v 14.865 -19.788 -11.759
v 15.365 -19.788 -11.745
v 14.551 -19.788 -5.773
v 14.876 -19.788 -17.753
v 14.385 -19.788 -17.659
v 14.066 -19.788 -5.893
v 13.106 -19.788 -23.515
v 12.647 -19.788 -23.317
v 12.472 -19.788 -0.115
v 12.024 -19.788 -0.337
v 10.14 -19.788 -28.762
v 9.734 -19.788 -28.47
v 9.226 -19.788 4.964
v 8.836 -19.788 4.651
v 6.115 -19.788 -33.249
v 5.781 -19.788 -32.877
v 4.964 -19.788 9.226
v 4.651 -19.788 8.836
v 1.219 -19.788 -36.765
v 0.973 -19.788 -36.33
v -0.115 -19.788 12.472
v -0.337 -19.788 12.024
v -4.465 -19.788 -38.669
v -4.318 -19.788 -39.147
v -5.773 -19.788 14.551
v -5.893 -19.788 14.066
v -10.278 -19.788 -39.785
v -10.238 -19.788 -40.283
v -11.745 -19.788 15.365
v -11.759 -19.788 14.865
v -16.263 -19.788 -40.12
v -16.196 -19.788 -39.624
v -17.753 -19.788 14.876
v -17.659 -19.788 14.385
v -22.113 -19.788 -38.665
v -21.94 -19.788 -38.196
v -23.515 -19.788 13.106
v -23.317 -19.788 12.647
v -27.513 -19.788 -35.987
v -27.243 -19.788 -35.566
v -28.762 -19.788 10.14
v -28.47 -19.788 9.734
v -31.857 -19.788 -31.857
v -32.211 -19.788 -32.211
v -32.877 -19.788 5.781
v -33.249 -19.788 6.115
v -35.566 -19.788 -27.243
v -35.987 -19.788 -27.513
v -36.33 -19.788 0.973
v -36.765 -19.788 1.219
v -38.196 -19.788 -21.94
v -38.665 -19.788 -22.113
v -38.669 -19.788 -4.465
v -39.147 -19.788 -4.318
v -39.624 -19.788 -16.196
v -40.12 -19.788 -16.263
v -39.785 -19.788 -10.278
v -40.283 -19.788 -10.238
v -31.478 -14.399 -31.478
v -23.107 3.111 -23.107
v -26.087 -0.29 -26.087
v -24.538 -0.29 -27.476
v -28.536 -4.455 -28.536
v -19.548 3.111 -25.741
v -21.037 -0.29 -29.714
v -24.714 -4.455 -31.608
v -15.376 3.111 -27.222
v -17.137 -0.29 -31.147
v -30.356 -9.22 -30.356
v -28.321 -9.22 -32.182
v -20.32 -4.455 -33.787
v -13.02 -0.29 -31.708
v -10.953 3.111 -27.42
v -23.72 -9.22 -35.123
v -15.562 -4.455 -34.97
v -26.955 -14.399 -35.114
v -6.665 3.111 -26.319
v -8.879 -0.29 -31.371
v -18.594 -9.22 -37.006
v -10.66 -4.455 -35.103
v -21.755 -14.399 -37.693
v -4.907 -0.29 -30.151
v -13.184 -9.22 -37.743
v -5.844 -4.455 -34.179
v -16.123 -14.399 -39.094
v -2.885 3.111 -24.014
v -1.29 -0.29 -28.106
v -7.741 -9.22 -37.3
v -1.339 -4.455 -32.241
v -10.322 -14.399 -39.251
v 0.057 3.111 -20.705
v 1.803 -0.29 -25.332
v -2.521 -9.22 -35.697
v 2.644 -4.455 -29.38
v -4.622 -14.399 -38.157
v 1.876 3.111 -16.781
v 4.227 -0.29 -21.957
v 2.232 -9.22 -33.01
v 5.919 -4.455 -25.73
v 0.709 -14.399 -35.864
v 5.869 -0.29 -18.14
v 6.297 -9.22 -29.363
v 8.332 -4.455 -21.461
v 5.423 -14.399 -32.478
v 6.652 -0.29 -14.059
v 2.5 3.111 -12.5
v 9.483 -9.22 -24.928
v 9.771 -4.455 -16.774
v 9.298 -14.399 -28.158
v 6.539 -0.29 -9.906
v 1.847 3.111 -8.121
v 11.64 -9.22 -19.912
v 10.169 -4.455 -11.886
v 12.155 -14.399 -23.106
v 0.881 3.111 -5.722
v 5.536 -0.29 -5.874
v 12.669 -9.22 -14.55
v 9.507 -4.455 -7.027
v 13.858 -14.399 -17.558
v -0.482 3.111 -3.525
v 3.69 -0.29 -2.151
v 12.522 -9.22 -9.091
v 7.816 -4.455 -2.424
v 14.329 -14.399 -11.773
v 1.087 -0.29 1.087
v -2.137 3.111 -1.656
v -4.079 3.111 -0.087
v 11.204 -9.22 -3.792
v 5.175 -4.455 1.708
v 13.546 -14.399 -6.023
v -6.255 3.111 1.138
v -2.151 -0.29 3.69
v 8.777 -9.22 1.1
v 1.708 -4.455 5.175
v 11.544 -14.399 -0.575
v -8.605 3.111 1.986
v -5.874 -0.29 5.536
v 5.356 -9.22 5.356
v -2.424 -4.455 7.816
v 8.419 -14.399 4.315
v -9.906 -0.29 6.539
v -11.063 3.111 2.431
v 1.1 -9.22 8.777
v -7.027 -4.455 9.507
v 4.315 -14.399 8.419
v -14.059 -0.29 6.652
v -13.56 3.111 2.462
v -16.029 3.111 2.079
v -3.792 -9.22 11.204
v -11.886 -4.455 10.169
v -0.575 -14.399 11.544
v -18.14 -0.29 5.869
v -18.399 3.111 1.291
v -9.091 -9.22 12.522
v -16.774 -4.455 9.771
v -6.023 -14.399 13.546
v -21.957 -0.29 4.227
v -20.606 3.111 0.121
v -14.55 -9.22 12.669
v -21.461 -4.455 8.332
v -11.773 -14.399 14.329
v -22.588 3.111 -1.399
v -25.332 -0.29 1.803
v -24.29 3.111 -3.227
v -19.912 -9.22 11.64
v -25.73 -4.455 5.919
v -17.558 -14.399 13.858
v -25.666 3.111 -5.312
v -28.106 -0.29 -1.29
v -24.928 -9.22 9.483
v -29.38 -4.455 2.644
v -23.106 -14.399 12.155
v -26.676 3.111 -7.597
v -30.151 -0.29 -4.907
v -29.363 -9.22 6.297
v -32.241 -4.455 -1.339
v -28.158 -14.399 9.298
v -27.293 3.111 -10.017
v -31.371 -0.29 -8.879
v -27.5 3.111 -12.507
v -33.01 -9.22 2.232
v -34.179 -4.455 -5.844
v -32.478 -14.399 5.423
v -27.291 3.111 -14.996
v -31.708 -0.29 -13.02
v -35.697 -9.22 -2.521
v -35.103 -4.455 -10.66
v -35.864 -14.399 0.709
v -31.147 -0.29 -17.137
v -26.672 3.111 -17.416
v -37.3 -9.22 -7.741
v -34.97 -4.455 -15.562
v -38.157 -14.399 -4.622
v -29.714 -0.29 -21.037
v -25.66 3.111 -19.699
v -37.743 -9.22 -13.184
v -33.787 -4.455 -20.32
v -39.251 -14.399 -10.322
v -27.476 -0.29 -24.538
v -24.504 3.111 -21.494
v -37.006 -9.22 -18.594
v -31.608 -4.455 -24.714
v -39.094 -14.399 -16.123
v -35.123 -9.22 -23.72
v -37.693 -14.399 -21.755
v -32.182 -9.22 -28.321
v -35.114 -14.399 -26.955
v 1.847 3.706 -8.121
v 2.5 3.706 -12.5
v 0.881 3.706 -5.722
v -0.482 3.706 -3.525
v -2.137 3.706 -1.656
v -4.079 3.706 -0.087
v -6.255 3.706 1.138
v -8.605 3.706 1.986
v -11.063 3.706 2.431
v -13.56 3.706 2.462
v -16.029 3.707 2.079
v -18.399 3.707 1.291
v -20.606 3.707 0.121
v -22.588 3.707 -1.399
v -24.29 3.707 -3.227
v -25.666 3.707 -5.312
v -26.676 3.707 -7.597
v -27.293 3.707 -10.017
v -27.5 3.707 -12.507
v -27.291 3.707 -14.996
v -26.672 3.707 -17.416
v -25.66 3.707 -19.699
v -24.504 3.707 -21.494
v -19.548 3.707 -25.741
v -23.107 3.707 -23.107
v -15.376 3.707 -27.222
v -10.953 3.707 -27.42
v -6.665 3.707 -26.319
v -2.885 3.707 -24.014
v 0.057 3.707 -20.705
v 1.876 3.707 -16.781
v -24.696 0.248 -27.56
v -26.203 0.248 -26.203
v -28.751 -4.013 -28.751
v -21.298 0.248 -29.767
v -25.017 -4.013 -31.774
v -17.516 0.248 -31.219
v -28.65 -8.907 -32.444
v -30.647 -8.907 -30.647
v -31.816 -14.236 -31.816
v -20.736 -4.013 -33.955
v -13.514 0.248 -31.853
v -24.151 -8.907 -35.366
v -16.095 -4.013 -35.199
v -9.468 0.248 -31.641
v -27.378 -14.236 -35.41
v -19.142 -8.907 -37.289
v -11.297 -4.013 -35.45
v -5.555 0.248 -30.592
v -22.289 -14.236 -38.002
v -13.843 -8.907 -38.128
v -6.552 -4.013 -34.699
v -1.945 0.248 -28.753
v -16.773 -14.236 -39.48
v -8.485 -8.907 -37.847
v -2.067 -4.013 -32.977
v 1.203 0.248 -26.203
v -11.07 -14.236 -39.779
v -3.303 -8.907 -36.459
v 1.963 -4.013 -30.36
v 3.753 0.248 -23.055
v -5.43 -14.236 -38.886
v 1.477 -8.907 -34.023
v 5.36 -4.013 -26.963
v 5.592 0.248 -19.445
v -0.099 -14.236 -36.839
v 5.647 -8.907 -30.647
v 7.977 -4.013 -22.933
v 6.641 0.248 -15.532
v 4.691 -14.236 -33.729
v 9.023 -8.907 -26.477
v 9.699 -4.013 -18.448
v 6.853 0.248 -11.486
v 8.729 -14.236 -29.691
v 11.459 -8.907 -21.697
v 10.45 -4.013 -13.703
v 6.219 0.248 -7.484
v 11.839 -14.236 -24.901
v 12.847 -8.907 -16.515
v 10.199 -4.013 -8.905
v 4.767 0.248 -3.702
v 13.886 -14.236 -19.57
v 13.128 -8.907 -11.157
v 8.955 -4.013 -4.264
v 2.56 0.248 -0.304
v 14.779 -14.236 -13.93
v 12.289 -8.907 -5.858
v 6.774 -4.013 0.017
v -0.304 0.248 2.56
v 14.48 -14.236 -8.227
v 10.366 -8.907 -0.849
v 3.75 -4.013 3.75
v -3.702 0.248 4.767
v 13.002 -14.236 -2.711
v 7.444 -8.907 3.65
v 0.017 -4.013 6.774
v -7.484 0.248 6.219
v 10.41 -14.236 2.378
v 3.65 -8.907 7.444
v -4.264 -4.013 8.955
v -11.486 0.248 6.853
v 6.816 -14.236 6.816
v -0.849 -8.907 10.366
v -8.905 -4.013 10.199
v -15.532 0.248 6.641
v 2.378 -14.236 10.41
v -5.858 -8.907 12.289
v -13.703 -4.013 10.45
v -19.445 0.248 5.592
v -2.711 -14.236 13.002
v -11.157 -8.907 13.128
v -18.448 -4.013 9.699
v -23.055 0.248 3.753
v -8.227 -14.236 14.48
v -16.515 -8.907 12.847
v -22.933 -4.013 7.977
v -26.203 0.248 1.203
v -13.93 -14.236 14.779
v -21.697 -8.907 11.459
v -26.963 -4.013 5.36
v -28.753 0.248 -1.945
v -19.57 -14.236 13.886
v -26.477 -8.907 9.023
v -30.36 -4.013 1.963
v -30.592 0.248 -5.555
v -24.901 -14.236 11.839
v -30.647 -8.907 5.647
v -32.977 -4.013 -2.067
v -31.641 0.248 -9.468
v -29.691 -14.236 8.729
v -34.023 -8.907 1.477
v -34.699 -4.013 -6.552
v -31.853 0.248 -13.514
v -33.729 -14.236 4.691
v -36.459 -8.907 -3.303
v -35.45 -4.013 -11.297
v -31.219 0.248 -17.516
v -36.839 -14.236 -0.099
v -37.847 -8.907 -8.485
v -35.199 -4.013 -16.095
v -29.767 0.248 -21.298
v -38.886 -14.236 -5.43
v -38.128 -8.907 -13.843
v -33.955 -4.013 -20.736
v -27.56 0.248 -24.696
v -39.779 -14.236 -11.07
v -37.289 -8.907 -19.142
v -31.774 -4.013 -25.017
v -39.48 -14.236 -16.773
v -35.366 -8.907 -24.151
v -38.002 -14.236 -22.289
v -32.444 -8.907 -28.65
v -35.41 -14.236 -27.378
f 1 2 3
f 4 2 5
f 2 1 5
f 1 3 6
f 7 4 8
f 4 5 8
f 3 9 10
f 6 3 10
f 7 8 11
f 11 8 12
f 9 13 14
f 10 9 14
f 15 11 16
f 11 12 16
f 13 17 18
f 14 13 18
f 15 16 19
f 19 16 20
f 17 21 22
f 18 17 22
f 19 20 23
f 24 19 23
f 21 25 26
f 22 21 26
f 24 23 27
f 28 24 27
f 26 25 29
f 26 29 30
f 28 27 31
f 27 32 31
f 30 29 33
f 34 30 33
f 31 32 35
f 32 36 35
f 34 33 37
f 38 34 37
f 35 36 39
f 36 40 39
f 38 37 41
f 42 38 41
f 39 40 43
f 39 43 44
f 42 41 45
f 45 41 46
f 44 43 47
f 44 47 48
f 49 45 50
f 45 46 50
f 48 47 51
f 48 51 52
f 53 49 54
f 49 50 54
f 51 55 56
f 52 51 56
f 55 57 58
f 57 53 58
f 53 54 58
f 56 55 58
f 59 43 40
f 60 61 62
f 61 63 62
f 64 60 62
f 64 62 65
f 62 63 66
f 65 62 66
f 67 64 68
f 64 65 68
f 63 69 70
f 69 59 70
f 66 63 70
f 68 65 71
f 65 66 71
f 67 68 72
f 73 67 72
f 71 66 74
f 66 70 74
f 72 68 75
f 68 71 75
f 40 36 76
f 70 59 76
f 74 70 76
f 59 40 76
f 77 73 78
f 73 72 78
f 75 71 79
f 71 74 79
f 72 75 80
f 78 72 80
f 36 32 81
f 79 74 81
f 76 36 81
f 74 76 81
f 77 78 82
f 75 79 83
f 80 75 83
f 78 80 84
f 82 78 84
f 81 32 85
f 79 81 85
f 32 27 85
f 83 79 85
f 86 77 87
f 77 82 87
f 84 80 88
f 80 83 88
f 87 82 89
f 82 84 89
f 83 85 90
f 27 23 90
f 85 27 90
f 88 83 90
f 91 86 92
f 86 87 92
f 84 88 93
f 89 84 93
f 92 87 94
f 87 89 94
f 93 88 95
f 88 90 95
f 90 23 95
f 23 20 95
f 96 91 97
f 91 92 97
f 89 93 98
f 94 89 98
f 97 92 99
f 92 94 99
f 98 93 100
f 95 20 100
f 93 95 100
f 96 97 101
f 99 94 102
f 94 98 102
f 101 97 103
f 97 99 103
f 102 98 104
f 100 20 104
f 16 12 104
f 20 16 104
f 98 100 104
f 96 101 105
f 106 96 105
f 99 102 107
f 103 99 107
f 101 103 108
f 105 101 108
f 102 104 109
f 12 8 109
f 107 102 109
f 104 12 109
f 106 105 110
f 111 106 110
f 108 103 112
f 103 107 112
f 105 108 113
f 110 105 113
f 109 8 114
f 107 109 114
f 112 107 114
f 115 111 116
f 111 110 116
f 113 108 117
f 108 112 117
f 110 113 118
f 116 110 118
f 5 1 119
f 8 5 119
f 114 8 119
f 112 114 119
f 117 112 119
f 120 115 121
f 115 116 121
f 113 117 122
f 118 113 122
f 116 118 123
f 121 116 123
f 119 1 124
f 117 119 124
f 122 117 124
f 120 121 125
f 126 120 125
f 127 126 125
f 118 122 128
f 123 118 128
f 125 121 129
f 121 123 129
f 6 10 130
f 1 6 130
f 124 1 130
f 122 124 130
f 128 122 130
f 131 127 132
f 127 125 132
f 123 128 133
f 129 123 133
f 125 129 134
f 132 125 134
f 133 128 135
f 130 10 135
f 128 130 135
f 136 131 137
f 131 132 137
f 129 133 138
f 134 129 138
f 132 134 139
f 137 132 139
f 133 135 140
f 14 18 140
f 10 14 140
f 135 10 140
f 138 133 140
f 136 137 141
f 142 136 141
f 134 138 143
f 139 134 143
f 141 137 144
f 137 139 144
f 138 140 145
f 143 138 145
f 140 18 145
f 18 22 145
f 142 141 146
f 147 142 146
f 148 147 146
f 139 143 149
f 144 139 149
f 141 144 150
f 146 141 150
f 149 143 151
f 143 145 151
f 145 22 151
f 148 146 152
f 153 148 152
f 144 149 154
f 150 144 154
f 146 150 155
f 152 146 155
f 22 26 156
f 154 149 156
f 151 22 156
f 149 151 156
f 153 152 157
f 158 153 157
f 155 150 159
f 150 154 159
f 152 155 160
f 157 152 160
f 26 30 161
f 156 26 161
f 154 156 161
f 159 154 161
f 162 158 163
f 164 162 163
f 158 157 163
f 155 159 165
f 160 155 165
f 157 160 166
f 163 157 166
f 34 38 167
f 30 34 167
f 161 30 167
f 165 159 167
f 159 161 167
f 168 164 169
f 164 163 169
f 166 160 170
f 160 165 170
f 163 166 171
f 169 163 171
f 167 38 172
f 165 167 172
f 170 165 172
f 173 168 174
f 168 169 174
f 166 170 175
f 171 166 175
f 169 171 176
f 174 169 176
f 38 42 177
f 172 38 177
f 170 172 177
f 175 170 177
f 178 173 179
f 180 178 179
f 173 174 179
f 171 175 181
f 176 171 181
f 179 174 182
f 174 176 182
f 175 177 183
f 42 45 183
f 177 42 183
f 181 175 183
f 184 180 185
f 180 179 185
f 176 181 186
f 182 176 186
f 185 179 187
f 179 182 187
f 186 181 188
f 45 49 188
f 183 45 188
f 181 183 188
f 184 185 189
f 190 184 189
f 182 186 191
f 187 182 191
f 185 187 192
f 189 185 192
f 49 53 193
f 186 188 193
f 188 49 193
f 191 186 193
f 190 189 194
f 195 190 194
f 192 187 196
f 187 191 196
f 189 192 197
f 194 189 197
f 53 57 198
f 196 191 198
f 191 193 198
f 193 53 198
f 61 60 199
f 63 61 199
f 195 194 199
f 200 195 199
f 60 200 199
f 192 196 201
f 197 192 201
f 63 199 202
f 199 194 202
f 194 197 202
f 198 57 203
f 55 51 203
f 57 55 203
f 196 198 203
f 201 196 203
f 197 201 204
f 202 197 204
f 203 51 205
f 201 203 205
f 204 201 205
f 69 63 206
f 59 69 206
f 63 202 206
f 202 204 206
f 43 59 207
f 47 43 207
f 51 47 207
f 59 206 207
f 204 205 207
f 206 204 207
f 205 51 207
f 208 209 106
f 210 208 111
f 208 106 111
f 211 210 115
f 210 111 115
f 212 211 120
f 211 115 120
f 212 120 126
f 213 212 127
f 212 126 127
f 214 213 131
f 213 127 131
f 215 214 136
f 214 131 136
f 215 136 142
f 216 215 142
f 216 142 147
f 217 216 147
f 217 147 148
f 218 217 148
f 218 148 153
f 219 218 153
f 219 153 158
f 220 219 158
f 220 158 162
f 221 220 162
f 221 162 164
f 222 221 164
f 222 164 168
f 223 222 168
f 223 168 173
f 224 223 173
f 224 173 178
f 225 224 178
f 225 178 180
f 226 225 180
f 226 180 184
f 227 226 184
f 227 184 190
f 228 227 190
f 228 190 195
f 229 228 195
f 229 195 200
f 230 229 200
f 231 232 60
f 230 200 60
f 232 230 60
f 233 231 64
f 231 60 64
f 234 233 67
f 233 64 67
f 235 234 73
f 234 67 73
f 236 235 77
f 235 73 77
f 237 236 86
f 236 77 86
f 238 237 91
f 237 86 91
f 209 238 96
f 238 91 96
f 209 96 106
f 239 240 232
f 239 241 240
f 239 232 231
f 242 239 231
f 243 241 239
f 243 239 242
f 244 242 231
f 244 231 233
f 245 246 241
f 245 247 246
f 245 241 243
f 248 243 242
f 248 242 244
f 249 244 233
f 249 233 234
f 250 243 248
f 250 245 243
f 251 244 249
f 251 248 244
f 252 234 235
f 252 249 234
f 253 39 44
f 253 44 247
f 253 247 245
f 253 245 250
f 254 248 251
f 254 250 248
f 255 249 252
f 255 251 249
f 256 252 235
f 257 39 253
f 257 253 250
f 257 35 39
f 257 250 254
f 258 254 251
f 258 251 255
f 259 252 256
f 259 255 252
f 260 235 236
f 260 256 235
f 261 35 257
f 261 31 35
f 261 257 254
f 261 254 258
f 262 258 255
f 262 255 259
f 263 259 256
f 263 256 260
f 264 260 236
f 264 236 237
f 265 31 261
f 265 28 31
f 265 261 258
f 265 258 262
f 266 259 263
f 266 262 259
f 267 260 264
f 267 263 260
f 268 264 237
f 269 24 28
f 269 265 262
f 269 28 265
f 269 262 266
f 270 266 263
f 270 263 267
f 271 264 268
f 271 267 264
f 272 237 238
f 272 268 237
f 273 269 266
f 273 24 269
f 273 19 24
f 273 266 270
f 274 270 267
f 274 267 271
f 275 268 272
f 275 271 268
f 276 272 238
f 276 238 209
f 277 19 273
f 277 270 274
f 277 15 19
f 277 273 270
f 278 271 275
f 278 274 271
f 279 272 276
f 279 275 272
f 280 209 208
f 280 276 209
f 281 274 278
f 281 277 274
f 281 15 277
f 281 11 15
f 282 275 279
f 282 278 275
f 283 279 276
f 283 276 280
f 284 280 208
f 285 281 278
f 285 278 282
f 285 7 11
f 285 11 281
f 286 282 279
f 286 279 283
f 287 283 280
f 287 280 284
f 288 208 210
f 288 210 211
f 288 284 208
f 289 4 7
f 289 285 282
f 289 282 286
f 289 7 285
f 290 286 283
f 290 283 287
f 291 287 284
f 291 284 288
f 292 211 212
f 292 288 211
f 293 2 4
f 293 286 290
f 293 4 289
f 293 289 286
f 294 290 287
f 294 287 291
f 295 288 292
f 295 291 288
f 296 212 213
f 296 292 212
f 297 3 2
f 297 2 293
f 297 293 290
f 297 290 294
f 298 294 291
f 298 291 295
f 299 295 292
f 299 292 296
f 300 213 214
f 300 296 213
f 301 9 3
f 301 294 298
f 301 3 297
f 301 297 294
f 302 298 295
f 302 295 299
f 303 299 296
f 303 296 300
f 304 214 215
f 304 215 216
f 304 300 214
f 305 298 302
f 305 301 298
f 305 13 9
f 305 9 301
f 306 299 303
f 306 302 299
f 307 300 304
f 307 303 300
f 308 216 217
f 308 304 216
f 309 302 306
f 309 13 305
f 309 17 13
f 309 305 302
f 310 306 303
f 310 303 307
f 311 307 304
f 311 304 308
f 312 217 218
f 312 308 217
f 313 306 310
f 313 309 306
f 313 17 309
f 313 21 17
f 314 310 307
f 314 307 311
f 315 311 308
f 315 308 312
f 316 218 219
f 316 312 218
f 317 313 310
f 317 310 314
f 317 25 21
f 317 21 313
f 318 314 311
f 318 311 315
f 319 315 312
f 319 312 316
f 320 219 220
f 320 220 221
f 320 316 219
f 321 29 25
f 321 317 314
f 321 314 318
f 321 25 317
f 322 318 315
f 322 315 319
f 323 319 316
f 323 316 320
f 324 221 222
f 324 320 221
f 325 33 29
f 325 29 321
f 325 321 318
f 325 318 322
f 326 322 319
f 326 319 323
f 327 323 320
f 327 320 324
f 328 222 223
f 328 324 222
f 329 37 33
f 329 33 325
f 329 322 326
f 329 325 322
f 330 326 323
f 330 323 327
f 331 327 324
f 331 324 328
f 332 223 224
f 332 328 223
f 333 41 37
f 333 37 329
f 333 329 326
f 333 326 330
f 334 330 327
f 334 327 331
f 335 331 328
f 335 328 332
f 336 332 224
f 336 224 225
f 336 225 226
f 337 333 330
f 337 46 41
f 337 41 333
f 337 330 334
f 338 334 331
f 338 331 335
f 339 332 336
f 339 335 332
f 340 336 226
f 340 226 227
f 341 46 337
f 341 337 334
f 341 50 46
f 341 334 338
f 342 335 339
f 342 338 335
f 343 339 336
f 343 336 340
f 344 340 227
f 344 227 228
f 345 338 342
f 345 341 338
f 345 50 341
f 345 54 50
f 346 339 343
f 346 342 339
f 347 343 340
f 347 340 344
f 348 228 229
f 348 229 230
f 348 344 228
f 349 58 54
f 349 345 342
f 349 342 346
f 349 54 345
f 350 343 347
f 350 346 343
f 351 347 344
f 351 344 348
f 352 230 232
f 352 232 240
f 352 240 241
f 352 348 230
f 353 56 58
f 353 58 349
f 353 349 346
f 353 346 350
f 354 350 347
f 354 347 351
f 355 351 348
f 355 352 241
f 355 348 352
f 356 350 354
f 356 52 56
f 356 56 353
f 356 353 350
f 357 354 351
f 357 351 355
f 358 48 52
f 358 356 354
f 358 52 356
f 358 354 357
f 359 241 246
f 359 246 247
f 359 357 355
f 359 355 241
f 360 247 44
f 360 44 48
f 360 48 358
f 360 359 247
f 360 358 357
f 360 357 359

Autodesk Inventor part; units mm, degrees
ref_plane "YZ Plane" through (0, 0, 0) normal (1, 0, 0) x (0, 1, 0)
sketch "Sketch1" plane through (0, 0, 0) normal (0, 1, 0) x (-1, 0, 0)
  line L0 (0, 0) -> (25, 0)
  line L1 (25, 0) -> (25, -25)
  line L2 (25, -25) -> (0, -25)
  line L3 (0, -25) -> (0, 0)
  circle A0 centre (12.5, -12.5) radius 17.6777
  circle A1 centre (12.5, -12.5) radius 21.86
  dimension "d0" = 25
  dimension "d1" = 25
  dimension "d2" = 43.72
extrude "Extrusion1" add sketch "Sketch1" along normal blind 1 contours L0 L1 L2 L3
ref_plane "Work Plane2" through (0, 0, 0) normal (-0.7071068, 0, 0.7071068) x (0, 1, 0)
sketch "Sketch3" plane through (0, 0, 0) normal (-0.7071068, 0, 0.7071068) x (0, 1, 0)
  line L0 (1, 0) -> (1, 17.6777) projected
  line L1 (1, 17.6777) -> (1, 35.3553) projected
  line L2 (1, 17.6777) -> (7.5, 17.6777) construction
  arc A0 (1, 0) -> (1, 35.3553) centre (-19.7885, 17.6777) ccw construction
  circle A1 centre (-19.7885, 17.6777) radius 27.375 construction
  circle A2 centre (-19.7885, 17.6777) radius 27.375
  circle A3 centre (-19.7885, 17.6777) radius 27.875
  line L3 (7.5, 17.6777) -> (8.0865, 17.6777)
  line L4 (-19.7885, 45.0527) -> (-19.7885, 45.5527)
  line L5 (-19.7885, 17.6777) -> (-5.3263, 17.6777)
  line L6 (-19.7885, 17.6777) -> (-19.7885, 45.0527)
  point P0 (0, 0)
  point P1 (7.5865, 17.6777)
  dimension "d10" = 6.5
  dimension "d11" = 54.75
  dimension "d12" = 55.75
revolve "Revolution1" add sketch "Sketch3" angle 360 about axis through (-12.5, -19.7885, -12.5) along (0, 1, 0) picked at (-9.7302, 43.3292) contours A2 L4 A3 L3
ref_plane "Work Plane3" through (0, 1, 0) normal (0, -1, 0) x (1, 0, 0)
sketch "Sketch5" plane through (0, 0, 0) normal (0, -1, 0) x (1, 0, 0)
  line L0 (0, -25) -> (-25, -25) construction
  line L1 (0, 0) -> (0, -25) construction
  line L2 (-25, 0) -> (0, 0) construction
  line L3 (-25, -25) -> (-25, 0) construction
  line L4 (-12.5, 0) -> (-12.5, -12.5) construction
  circle A0 centre (-12.5, -12.5) radius 15
  dimension "d33" = 12.5
  dimension "d34" = 30
extrude "Extrusion3" cut sketch "Sketch5" against normal blind 10
sketch "Sketch6" plane through (0, 0, 0) normal (0, -1, 0) x (1, 0, 0)
  arc A0 (-25, -20.7916) -> (-20.7916, -25) centre (-12.5, -12.5) ccw projected
  line L0 (0, -25) -> (-4.2084, -25) projected
  line L1 (0, 0) -> (0, -4.2084) projected
  line L2 (-25, 0) -> (-20.7916, 0) projected
  line L3 (-25, -25) -> (-25, -20.7916) projected
  line L4 (-20.7916, -25) -> (-25, -25) projected
  arc A1 (-4.2084, -25) -> (0, -20.7916) centre (-12.5, -12.5) ccw projected
  line L5 (0, -20.7916) -> (0, -25) projected
  arc A2 (0, -4.2084) -> (-4.2084, 0) centre (-12.5, -12.5) ccw projected
  line L6 (-4.2084, 0) -> (0, 0) projected
  arc A3 (-20.7916, 0) -> (-25, -4.2084) centre (-12.5, -12.5) ccw projected
  line L7 (-25, -4.2084) -> (-25, 0) projected
extrude "Extrusion4" cut sketch "Sketch6" against normal blind 1
properties part number "Ball"
